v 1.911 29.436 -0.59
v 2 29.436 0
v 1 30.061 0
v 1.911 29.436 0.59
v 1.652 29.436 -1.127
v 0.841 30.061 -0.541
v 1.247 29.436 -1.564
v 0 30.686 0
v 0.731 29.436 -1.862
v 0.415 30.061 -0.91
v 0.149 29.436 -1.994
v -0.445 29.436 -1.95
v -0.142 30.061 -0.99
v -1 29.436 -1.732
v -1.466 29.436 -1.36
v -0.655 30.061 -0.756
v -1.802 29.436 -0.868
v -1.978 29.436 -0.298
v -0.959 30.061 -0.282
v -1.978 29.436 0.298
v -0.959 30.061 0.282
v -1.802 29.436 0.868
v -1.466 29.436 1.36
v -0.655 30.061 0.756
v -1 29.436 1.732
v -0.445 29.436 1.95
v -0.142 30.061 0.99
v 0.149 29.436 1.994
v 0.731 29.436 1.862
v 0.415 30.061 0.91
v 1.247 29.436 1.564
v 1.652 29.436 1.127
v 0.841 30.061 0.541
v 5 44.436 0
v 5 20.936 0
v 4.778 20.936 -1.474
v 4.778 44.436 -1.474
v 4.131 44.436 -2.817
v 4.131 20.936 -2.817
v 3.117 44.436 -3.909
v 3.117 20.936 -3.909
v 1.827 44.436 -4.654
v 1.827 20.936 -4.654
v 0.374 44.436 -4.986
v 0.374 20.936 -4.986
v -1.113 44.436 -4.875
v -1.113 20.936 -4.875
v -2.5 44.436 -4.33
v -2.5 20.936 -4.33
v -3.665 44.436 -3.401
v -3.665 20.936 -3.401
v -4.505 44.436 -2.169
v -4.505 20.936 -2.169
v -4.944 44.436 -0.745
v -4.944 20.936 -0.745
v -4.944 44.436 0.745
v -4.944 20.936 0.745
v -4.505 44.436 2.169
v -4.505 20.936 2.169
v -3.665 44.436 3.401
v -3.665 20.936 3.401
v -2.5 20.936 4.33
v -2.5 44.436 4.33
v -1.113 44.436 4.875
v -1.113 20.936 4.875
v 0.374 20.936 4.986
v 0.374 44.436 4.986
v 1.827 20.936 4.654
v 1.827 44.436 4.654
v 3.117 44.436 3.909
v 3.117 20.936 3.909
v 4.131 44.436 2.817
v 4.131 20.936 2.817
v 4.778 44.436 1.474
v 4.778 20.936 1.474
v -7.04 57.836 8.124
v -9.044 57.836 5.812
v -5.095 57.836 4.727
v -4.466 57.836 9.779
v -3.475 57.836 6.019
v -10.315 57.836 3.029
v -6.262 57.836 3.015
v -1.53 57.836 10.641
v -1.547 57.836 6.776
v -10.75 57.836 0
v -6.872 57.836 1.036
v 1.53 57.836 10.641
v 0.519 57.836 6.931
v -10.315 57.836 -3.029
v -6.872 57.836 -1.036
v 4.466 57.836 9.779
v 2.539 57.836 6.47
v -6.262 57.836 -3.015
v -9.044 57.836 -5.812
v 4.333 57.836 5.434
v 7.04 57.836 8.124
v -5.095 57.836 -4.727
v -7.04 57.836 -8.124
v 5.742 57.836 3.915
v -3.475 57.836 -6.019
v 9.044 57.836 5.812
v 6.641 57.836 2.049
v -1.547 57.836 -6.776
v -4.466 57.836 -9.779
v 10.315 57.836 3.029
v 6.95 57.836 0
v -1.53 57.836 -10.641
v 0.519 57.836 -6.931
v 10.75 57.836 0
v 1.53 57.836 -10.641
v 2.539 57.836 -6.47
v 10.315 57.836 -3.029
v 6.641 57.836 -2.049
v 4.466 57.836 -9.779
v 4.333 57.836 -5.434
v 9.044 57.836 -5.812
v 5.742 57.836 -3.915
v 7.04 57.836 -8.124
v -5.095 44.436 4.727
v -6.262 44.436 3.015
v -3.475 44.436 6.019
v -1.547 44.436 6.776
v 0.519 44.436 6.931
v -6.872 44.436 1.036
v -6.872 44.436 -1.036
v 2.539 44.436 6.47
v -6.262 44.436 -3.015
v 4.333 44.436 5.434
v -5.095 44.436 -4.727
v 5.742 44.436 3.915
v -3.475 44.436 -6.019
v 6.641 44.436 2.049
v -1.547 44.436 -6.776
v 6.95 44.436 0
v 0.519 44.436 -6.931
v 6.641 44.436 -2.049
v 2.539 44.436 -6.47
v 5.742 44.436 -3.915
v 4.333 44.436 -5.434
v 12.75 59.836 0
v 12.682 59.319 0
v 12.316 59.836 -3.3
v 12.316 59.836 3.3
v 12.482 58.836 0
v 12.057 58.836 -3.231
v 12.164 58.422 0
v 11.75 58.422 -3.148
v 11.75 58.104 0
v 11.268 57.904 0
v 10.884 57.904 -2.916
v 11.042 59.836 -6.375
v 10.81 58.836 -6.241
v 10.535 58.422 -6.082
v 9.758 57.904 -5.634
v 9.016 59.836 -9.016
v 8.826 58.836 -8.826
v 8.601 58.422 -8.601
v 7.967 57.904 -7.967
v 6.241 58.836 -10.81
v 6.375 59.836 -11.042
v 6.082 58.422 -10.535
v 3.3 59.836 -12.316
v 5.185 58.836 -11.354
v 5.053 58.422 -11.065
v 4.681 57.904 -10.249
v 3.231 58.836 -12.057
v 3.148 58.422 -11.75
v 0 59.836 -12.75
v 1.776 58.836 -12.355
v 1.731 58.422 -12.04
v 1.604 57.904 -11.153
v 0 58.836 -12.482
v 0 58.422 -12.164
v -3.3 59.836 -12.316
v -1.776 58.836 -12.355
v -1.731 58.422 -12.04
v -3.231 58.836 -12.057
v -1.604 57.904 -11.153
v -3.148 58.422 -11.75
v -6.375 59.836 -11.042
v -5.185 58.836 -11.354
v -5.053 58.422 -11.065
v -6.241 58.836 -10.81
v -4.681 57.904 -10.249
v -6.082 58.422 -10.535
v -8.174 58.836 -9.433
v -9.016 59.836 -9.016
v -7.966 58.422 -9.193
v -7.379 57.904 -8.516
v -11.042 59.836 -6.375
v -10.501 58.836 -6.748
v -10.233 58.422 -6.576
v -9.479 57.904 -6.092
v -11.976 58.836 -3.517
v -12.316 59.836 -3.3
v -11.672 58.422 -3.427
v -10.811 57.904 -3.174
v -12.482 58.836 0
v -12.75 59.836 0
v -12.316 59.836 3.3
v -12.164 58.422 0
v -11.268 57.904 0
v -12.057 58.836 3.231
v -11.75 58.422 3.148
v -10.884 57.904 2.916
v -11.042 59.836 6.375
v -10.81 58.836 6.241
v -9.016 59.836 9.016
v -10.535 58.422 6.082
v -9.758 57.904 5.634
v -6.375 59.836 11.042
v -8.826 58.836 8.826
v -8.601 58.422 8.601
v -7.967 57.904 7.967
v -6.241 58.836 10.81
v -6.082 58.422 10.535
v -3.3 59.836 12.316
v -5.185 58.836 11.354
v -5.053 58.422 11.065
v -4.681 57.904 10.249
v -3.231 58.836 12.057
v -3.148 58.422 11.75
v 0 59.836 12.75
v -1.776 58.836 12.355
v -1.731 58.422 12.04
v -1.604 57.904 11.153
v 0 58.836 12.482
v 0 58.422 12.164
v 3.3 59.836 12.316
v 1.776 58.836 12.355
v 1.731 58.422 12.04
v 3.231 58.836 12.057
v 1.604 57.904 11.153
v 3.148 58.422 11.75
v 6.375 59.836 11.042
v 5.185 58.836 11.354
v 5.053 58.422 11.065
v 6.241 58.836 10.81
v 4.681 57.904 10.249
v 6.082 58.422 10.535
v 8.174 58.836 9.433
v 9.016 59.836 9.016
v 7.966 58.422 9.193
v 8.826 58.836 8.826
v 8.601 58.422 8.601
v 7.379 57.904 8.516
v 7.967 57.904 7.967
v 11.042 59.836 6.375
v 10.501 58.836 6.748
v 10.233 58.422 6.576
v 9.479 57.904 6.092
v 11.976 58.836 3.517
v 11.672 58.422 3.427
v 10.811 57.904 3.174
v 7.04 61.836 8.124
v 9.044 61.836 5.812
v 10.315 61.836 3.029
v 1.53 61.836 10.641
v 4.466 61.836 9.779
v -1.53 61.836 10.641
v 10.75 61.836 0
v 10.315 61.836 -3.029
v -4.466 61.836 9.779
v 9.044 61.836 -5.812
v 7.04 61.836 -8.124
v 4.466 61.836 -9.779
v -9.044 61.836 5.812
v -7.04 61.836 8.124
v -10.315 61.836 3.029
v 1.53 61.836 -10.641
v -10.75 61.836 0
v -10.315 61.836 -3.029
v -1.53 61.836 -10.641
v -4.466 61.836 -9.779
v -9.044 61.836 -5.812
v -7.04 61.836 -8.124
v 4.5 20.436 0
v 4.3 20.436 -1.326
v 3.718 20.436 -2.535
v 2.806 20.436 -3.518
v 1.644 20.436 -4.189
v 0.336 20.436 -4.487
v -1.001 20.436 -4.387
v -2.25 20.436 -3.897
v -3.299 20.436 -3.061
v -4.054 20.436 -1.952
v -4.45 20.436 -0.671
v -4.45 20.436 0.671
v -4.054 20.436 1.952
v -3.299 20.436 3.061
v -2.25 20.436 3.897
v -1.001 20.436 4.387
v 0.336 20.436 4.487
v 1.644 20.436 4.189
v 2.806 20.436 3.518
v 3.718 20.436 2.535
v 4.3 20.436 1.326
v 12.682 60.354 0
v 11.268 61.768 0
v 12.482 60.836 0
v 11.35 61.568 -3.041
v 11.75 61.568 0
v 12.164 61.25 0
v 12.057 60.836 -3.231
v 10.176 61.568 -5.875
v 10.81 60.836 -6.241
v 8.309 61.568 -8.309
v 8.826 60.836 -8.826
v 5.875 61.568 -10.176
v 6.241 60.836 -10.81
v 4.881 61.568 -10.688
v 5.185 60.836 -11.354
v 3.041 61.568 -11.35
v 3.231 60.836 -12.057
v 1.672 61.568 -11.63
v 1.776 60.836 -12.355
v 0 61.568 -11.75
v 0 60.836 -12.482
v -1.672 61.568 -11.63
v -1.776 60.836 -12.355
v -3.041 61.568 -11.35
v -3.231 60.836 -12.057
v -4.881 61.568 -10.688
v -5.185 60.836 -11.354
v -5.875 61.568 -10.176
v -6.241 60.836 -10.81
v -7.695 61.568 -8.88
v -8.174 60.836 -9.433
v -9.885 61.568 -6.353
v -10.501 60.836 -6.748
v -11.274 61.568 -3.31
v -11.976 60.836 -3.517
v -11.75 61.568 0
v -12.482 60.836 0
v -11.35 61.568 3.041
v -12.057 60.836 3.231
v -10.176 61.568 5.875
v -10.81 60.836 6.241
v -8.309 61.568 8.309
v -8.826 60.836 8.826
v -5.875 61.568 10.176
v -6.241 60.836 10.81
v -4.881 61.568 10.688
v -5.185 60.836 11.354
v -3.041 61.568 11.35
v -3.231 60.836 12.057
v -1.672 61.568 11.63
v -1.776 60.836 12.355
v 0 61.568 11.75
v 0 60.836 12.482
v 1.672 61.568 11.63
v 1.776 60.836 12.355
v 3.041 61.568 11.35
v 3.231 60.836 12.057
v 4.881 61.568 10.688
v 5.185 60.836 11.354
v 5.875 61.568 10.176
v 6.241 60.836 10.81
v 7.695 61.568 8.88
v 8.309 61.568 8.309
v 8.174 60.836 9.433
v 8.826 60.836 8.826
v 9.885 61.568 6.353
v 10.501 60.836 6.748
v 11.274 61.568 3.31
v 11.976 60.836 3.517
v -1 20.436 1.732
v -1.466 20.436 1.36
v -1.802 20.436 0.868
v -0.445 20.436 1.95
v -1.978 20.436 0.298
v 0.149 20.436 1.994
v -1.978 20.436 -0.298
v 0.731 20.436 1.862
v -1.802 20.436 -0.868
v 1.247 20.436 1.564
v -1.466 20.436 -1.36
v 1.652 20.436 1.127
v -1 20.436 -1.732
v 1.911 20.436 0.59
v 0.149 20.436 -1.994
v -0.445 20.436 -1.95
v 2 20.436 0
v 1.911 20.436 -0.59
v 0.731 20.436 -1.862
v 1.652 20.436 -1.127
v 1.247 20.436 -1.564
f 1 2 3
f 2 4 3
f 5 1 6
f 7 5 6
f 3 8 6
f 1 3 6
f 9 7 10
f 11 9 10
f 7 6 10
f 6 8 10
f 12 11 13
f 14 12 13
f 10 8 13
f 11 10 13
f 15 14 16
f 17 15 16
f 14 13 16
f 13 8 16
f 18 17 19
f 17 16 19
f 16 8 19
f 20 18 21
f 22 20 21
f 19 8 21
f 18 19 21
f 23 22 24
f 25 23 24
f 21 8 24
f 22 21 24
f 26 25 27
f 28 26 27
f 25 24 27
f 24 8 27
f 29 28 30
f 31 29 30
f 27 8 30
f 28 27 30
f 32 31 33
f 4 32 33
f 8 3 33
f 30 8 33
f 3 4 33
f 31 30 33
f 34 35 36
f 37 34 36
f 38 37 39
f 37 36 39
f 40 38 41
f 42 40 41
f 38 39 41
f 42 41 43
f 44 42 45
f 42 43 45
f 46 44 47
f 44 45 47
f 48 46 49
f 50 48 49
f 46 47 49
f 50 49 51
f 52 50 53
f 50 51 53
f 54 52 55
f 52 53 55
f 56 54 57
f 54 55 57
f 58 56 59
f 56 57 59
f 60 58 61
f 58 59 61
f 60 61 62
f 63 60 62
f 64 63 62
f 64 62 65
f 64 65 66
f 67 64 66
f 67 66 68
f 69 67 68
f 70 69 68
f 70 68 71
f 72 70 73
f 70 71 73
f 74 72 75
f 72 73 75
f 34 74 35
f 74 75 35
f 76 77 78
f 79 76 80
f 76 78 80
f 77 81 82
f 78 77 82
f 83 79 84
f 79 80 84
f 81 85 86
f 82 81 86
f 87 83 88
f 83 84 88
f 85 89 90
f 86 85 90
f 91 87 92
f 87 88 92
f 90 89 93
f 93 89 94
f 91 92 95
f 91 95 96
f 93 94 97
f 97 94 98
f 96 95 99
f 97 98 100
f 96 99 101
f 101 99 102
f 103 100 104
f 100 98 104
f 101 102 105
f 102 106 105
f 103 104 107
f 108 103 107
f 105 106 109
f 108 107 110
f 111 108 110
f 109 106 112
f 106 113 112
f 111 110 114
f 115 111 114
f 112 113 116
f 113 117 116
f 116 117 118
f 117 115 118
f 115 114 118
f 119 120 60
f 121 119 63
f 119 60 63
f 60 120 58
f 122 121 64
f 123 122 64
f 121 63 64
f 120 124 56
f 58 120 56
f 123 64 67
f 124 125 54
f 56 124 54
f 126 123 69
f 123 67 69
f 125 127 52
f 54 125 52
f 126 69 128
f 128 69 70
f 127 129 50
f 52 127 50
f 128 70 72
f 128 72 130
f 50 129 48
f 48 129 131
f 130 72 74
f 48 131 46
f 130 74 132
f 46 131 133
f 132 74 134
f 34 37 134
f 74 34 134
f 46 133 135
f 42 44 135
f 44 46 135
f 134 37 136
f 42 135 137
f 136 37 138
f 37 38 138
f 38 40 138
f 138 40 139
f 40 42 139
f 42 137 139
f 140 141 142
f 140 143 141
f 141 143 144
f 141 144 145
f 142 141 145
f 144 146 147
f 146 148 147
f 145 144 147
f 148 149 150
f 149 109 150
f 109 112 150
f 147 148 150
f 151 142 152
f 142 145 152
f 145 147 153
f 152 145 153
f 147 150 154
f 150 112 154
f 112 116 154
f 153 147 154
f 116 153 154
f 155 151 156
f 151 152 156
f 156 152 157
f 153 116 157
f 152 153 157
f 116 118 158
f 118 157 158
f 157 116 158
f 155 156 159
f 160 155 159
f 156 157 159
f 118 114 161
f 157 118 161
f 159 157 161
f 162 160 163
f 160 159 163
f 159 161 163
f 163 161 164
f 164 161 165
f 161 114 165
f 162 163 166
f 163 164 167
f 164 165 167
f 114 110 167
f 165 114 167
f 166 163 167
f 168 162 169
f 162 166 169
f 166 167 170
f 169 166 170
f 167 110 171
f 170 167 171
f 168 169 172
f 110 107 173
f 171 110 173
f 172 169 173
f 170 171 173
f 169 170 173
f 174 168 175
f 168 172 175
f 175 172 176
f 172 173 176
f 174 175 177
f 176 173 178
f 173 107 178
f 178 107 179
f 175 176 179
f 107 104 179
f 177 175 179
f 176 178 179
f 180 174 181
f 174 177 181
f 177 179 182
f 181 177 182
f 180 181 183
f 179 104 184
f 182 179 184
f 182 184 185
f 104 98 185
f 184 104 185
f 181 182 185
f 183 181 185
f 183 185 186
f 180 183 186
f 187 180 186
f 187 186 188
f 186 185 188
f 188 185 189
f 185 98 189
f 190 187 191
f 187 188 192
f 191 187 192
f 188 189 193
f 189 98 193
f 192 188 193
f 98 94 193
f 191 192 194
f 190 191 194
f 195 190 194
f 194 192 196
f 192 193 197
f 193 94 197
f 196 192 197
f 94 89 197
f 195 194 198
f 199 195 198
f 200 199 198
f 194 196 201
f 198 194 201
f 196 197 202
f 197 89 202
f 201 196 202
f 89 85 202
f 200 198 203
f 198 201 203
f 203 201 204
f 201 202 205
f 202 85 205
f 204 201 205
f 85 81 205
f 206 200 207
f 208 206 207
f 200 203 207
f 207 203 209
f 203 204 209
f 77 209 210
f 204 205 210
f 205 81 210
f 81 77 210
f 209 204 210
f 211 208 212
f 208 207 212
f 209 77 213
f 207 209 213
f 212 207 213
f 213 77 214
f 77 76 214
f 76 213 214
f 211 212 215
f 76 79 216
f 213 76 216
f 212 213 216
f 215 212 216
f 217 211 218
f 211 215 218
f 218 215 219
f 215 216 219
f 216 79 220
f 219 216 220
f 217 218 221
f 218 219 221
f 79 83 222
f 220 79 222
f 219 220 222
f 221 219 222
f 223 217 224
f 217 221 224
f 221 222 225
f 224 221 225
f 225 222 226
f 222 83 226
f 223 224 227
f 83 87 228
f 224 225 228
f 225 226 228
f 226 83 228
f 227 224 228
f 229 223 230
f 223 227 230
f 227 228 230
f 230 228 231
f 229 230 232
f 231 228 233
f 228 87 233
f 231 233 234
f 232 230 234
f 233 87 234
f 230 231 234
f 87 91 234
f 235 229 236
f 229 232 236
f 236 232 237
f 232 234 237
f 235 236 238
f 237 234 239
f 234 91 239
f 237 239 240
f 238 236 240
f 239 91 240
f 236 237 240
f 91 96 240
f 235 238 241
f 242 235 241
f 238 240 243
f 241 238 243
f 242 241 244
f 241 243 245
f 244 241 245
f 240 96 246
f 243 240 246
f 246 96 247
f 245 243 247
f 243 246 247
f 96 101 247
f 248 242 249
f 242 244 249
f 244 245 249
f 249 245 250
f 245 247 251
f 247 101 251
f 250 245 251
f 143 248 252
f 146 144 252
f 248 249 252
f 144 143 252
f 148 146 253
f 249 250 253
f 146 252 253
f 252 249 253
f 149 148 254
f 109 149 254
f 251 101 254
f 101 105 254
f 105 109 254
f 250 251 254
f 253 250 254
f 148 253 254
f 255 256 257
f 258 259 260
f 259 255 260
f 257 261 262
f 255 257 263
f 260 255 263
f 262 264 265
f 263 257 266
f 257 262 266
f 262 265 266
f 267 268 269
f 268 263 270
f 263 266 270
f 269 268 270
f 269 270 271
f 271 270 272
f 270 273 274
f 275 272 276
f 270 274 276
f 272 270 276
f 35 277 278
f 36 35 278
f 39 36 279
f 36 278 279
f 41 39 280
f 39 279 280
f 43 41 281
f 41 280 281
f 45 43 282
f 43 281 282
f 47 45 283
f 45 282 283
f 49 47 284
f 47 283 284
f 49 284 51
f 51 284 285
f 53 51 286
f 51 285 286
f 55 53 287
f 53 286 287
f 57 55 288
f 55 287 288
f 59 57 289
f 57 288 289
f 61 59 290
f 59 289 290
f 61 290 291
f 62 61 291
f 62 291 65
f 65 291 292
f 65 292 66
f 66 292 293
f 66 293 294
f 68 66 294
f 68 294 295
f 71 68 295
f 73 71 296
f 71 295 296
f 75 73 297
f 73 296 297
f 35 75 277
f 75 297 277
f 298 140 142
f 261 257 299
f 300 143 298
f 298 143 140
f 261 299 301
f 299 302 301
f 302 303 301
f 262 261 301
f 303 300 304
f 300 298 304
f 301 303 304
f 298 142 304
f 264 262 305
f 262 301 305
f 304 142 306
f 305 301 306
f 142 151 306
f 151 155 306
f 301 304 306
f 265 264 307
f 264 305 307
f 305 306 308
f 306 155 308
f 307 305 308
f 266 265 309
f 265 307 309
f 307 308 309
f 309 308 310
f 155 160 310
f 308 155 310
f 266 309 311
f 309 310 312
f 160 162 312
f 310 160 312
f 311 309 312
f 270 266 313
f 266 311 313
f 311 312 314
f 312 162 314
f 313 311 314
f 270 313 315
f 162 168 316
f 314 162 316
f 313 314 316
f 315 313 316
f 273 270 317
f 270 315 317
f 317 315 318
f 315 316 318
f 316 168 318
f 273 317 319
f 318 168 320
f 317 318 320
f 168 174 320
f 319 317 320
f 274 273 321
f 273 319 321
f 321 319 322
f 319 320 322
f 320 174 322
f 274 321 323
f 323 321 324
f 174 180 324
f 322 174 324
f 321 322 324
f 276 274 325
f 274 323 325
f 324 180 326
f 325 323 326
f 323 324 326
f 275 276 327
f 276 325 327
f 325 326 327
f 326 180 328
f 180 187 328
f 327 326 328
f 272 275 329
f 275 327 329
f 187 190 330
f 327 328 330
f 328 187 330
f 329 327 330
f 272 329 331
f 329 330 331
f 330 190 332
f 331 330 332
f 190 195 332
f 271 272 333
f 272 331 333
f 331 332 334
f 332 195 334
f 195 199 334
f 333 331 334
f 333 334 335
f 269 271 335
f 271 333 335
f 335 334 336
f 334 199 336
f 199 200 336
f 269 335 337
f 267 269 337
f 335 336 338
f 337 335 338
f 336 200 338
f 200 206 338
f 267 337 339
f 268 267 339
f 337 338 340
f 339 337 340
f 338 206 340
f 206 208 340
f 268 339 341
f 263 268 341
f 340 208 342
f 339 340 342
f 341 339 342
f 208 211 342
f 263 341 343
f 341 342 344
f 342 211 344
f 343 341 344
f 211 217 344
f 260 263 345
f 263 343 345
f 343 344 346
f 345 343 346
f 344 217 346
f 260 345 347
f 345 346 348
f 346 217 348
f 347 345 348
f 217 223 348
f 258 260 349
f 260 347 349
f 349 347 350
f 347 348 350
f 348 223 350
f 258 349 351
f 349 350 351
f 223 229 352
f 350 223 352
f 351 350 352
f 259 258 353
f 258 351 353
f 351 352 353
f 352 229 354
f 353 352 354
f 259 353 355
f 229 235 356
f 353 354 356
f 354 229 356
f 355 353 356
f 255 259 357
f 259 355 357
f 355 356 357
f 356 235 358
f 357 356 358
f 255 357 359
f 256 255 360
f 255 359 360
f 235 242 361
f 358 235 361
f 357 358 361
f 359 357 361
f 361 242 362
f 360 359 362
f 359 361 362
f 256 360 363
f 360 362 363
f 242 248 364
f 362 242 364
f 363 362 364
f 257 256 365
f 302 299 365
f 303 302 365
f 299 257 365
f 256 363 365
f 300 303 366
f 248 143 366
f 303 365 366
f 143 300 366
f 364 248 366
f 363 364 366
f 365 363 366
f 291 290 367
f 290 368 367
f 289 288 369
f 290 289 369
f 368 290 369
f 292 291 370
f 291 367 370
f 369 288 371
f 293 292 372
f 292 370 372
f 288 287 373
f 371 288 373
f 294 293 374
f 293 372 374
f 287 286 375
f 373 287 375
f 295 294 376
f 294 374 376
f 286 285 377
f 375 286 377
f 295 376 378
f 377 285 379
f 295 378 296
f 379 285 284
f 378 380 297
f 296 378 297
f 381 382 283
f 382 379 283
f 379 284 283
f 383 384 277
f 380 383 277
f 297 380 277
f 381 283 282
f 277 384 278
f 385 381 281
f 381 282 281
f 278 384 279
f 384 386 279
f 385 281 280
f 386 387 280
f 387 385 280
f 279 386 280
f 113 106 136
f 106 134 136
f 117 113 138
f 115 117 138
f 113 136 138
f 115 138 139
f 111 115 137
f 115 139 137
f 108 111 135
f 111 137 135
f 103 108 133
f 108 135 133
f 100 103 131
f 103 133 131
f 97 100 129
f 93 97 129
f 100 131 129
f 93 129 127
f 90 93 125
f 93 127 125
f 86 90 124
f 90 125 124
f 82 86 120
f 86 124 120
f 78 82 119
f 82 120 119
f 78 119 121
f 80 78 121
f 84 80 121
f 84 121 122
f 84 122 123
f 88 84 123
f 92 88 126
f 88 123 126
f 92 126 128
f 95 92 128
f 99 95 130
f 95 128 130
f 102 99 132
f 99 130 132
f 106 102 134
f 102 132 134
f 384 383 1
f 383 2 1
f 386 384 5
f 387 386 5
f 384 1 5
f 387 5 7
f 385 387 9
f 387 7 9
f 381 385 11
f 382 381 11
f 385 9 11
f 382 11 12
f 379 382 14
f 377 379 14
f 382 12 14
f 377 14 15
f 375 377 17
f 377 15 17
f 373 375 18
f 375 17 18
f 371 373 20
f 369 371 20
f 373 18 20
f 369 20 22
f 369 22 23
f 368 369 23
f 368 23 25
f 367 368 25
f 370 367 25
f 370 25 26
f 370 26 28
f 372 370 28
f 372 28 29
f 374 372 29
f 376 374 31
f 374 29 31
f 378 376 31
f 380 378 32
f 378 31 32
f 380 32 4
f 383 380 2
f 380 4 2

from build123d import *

# Parameters (mm, degrees)
FILETE1_R     = 2
CHANFRO1_SIZE = 0.5


with BuildPart() as part:
    # Esboço1 → Revolução1 (revolve)
    with BuildSketch(Plane.XY):
        Polygon((0, 61.836212625), (12.75, 61.836212625), (12.75, 57.836212625), (6.95, 57.836212625), (6.95, 44.436212625), (5, 44.436212625), (5, 20.436212625), (2, 20.436212625), (2, 29.436212625), (0, 30.686212625), align=None)
    revolve(axis=Axis((0, -52.719767442, 0), (0, 1, 0)))

    # Filete1
    filete1_edges = [part.edges().sort_by_distance(p)[0] for p in [
        (-12.75, 57.836212625, 0),
        (-12.75, 61.836212625, 0),
    ]]
    fillet(filete1_edges, radius=FILETE1_R - 0.0001)  # a hair under: the kernel refuses the full size

    # Chanfro1
    chanfro1_edges = [part.edges().sort_by_distance(p)[0] for p in [
        (-5, 20.436212625, 0),
    ]]
    chamfer(chanfro1_edges, length=CHANFRO1_SIZE)


solid = part.part
